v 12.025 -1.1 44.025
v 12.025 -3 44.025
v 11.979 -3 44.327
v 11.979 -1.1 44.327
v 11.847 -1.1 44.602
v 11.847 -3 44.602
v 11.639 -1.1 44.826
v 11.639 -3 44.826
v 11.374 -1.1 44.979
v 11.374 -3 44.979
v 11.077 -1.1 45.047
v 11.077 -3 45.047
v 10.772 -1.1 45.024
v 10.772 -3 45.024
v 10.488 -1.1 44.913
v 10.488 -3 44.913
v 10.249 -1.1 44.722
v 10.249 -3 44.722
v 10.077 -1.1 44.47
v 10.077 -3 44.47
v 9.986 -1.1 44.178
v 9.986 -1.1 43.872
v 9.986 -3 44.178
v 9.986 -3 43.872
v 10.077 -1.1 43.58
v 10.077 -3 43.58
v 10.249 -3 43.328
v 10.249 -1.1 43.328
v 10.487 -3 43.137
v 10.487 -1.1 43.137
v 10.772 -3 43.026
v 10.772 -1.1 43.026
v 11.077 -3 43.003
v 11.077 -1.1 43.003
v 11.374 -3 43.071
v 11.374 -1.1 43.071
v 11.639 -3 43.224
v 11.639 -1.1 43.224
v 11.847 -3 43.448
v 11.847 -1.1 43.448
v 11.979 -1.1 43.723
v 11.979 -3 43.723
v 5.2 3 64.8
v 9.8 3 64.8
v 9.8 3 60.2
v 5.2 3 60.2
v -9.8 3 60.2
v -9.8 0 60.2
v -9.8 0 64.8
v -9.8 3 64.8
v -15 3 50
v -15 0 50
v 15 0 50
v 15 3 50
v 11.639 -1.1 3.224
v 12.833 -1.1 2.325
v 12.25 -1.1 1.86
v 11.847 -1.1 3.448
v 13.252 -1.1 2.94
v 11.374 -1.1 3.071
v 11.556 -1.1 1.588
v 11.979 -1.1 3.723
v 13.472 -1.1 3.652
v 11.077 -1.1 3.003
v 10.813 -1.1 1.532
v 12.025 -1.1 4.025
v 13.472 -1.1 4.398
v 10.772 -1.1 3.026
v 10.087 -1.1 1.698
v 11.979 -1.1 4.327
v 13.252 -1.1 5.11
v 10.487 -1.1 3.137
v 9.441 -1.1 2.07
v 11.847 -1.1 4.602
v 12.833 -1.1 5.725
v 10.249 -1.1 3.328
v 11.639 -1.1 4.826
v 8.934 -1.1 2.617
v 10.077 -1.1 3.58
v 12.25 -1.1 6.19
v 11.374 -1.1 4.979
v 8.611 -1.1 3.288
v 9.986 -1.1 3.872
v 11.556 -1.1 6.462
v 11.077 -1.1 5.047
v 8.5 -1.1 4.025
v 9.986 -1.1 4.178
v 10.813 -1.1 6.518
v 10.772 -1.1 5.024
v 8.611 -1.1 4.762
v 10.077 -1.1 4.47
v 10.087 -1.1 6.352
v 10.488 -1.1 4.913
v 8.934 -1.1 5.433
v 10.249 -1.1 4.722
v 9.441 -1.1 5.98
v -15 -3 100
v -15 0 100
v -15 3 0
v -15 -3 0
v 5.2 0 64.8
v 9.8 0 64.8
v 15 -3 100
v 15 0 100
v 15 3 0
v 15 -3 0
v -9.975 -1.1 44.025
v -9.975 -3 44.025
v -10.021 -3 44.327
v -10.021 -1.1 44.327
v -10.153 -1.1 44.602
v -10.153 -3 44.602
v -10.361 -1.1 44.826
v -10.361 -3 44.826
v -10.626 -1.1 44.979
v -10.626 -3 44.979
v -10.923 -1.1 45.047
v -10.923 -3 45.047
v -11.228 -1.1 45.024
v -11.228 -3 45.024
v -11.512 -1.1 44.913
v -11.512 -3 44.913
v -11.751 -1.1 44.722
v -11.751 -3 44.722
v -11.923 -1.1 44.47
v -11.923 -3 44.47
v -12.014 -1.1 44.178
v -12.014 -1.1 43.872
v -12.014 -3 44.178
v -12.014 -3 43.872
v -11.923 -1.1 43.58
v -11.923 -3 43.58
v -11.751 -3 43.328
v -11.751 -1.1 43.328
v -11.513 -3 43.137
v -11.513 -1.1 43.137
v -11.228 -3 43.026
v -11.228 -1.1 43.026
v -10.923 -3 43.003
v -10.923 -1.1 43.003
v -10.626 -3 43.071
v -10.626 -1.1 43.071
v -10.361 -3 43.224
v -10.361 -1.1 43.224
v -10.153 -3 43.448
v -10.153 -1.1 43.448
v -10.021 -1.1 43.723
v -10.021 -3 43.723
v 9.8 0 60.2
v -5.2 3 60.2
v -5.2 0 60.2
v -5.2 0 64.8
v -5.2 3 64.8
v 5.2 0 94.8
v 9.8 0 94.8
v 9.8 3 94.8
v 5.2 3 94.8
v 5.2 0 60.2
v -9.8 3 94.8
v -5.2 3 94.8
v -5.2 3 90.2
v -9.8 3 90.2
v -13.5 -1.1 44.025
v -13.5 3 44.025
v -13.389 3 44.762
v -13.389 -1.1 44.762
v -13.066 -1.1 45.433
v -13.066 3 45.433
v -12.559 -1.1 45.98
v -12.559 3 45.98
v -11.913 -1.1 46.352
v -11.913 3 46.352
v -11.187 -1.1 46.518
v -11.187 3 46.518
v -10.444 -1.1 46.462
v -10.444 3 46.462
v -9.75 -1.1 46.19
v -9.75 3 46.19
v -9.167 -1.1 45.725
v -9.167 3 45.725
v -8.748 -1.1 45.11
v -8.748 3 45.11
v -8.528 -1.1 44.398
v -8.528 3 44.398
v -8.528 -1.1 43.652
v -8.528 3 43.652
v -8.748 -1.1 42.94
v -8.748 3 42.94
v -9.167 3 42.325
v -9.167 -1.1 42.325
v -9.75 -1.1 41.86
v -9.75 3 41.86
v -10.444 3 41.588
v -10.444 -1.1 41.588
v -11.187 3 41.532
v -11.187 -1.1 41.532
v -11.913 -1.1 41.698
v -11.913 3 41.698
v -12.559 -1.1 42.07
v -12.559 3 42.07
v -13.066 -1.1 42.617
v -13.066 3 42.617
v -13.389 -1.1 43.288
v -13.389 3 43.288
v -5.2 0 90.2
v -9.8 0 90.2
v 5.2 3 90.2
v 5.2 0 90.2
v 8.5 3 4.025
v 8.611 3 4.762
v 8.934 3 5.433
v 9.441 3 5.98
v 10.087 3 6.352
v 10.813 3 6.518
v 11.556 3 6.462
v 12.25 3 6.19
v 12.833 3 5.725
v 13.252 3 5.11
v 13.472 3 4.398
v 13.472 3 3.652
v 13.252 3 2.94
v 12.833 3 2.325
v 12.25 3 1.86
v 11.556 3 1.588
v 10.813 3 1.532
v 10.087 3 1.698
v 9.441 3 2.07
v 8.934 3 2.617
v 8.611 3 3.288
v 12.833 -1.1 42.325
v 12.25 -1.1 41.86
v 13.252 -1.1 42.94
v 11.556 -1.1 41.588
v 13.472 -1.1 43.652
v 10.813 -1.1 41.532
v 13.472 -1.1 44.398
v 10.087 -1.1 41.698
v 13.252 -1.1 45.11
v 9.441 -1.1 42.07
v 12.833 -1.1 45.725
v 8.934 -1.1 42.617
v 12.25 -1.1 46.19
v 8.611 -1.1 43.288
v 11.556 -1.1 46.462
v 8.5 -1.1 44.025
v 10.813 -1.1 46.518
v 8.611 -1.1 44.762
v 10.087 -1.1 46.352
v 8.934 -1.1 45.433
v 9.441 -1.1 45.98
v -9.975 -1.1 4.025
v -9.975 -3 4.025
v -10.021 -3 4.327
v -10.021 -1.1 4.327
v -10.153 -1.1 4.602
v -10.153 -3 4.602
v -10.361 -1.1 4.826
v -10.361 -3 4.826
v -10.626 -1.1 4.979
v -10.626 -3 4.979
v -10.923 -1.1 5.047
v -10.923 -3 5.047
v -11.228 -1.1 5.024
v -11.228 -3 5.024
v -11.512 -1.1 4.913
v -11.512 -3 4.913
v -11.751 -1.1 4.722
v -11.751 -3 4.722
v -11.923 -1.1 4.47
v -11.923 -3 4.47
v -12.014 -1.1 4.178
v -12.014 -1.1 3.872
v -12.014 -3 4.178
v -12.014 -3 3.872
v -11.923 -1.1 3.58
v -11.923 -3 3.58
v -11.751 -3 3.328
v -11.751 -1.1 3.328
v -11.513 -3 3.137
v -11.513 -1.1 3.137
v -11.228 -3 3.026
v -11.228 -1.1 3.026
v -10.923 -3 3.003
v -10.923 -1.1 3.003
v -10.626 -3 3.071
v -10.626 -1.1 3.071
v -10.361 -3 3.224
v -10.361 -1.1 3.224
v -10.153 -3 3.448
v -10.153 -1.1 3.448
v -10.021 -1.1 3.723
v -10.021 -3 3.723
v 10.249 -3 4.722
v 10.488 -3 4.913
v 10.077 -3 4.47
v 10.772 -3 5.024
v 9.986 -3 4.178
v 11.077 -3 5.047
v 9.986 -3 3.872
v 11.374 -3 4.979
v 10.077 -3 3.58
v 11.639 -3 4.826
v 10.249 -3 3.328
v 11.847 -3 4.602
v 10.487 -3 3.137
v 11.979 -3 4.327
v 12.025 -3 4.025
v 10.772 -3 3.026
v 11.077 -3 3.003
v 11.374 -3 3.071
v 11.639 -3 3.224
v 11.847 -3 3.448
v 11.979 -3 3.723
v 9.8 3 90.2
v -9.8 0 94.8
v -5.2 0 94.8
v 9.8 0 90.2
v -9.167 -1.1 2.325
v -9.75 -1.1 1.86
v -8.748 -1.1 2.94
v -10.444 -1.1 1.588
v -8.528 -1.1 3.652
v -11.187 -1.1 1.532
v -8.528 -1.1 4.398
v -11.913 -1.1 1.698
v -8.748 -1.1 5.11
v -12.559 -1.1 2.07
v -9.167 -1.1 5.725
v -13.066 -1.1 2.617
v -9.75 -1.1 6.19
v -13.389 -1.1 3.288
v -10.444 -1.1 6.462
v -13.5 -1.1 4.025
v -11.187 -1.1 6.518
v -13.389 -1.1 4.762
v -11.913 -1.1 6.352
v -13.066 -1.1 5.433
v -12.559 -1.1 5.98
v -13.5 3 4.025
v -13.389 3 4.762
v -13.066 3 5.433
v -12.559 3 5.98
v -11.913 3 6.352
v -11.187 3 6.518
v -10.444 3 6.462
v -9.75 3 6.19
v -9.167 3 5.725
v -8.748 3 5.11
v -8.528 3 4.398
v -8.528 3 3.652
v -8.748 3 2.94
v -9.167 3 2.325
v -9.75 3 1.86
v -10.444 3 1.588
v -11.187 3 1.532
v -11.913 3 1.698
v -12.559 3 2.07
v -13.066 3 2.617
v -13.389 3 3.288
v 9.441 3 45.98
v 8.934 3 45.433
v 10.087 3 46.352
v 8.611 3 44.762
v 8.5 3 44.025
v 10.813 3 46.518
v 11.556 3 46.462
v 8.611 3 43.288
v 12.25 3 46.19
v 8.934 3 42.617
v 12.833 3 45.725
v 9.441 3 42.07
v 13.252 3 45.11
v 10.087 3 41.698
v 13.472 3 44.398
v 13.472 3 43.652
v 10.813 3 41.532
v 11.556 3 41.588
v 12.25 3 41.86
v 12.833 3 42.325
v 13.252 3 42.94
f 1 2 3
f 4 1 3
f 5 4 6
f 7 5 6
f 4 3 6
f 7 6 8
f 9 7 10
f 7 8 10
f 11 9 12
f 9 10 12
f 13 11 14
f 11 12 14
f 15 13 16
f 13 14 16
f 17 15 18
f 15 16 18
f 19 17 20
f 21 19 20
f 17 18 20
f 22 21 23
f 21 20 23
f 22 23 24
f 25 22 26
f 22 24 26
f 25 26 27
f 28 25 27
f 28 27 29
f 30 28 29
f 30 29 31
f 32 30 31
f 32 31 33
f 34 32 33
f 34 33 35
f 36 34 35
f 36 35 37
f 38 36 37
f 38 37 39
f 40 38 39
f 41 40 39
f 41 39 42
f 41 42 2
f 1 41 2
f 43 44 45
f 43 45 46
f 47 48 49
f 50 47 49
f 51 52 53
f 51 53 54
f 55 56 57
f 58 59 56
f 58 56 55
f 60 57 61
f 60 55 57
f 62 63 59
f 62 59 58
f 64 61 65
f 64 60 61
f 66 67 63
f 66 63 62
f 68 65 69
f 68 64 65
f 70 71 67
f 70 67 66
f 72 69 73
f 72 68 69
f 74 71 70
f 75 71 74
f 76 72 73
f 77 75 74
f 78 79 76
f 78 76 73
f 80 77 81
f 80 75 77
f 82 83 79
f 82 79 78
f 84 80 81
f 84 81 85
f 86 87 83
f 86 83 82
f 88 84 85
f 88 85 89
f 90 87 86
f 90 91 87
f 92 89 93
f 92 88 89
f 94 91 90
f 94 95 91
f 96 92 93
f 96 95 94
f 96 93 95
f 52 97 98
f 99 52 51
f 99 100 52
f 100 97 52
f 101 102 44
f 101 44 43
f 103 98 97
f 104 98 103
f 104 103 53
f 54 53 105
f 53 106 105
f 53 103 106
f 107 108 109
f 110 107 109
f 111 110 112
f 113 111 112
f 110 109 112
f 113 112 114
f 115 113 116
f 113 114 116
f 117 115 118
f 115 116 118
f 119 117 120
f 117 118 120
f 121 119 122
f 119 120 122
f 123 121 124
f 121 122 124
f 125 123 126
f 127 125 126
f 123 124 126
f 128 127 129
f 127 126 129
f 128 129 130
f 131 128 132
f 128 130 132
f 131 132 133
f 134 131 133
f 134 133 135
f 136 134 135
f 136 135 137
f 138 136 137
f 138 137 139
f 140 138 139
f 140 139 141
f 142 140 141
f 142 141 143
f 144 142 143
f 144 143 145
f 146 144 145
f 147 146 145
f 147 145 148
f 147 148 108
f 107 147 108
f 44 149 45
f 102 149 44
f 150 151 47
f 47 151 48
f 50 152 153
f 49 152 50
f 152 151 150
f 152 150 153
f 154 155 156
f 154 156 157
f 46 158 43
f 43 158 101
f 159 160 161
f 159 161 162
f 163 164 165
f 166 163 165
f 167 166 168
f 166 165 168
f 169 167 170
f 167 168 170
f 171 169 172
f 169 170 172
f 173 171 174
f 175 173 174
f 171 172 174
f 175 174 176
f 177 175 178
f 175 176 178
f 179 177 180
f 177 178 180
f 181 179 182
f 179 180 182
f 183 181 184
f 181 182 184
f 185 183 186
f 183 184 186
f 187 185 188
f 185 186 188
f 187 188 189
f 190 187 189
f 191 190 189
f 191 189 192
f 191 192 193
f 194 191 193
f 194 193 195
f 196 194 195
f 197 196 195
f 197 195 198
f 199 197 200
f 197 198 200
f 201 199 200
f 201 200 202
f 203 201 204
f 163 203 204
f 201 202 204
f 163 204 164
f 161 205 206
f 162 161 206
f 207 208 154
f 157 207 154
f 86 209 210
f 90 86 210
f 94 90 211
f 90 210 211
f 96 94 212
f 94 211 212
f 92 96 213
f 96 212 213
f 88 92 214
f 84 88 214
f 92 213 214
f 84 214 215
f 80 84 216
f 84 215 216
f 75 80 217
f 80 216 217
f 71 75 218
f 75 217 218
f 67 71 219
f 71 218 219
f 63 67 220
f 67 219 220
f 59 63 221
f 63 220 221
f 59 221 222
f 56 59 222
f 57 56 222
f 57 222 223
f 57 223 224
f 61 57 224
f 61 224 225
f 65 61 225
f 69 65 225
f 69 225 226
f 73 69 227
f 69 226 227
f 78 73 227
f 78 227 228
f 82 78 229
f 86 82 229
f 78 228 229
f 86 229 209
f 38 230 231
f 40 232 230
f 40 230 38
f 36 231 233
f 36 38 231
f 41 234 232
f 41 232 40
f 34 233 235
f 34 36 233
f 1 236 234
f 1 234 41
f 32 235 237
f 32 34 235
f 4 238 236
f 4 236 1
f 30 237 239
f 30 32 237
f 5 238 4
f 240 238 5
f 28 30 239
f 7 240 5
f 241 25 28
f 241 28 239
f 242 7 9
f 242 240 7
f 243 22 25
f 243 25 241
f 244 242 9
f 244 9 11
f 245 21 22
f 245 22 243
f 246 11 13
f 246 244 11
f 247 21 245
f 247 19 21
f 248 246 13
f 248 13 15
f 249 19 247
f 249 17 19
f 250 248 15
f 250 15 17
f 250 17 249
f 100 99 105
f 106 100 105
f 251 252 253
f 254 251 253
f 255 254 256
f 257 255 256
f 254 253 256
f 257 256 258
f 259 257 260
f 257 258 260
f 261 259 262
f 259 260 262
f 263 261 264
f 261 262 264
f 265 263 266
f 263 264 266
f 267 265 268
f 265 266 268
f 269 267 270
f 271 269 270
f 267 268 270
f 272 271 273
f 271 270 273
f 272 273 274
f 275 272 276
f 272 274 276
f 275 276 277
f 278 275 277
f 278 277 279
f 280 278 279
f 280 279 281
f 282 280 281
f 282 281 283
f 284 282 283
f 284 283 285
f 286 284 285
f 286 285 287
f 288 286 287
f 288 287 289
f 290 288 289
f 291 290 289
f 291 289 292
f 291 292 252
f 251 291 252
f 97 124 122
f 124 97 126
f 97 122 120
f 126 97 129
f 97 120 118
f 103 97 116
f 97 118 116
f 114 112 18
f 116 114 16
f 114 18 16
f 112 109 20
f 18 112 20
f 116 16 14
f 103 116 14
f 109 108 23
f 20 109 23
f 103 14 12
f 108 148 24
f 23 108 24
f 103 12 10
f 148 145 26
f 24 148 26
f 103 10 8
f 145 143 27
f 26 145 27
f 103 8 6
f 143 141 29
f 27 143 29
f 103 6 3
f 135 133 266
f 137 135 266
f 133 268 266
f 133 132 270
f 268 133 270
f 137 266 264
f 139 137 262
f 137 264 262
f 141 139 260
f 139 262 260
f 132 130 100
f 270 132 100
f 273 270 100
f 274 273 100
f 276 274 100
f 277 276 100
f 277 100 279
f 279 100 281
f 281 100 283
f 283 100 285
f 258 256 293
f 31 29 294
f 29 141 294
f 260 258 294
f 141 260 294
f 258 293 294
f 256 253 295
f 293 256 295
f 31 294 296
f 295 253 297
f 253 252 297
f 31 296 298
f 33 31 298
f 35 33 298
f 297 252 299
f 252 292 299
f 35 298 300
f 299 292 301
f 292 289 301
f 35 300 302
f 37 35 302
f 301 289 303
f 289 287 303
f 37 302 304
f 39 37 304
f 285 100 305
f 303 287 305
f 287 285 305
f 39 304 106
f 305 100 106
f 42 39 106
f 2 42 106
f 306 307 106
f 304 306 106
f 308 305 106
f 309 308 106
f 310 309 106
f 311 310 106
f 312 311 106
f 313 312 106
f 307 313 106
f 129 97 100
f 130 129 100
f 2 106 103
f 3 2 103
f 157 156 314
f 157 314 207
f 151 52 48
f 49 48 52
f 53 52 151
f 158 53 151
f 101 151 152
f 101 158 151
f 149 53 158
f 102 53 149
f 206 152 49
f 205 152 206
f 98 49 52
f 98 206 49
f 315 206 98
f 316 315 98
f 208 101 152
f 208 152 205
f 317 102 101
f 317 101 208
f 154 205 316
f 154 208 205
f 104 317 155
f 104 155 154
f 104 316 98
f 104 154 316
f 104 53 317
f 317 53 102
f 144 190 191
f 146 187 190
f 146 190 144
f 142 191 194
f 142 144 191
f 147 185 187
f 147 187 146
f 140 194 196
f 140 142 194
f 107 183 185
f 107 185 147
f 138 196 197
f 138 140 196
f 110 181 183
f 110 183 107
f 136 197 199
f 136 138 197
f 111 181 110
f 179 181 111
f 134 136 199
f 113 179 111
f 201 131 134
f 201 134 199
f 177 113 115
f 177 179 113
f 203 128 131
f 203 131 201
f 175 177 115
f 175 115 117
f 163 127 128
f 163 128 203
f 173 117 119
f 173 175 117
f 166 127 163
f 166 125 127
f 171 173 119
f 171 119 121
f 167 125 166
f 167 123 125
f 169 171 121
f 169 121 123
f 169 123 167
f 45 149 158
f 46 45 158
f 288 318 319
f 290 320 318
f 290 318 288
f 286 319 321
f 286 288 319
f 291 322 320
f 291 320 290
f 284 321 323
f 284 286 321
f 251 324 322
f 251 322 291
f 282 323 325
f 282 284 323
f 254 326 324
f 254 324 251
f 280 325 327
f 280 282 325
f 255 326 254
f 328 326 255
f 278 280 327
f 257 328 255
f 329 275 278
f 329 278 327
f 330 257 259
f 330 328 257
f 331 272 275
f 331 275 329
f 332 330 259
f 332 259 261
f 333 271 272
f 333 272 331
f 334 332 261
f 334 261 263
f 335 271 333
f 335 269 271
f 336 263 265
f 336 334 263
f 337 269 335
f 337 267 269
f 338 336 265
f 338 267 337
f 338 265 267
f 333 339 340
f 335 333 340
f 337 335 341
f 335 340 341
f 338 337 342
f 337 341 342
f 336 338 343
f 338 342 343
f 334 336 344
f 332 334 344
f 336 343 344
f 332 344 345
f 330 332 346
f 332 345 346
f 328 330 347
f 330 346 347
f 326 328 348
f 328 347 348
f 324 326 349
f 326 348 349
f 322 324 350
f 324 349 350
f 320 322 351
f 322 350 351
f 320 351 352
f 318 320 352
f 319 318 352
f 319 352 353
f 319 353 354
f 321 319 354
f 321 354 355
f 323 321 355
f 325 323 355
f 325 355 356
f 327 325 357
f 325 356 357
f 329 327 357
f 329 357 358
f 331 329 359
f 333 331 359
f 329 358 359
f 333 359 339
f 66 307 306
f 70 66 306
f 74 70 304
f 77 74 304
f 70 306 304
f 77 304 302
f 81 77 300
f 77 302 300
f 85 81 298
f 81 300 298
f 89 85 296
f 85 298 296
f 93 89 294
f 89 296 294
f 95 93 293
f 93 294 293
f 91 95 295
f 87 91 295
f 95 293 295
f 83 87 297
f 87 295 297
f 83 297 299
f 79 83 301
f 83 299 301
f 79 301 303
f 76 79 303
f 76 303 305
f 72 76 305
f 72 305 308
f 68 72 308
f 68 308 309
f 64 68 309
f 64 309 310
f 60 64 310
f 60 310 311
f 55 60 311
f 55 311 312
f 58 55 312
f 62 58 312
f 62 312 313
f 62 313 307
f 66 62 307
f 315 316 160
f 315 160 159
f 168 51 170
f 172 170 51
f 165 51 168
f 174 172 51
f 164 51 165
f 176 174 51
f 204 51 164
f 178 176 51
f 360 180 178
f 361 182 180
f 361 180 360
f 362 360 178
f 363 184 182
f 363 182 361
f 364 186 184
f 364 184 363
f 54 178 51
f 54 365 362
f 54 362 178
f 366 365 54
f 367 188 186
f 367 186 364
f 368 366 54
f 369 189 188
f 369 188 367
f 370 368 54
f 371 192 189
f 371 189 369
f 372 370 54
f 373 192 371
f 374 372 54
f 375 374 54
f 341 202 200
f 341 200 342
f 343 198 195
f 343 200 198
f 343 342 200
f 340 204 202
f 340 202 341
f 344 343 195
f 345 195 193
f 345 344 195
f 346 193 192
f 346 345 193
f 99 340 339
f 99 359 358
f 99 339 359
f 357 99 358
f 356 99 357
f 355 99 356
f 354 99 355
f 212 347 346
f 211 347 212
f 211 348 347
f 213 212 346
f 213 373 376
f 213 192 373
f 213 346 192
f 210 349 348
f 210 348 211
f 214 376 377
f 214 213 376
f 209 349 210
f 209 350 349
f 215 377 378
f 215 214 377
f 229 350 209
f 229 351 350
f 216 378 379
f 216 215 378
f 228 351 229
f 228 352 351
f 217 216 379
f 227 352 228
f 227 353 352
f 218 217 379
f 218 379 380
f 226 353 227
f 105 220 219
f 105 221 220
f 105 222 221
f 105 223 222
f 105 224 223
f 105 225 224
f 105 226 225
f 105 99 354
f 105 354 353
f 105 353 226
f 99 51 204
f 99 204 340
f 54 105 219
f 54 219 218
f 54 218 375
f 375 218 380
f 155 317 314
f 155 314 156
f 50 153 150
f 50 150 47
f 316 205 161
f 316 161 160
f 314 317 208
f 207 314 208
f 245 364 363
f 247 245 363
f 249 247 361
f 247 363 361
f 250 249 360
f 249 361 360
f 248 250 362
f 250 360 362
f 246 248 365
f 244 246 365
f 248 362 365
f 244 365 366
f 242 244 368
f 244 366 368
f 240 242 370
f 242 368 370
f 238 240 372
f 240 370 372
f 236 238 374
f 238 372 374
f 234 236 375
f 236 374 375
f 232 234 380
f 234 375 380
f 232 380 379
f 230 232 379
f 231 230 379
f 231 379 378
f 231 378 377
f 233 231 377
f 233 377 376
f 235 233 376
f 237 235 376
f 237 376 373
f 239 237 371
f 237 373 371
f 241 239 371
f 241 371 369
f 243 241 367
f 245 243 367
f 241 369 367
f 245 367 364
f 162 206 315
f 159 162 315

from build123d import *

# Parameters (mm, degrees)
F0_W     = 30
F0_H     = 6
F1_DEPTH = 100
F2_R     = 1.025
F3_DEPTH = 6
F4_W     = 3
F4_H     = 50
F5_DEPTH = 30
F6_W     = 4.600006
F6_H     = 4.600006
F6_W_2   = 4.6
F6_H_2   = 4.6
F6_W_3   = 4.600004
F6_H_3   = 4.600004
F7_DEPTH = 3
F8_R     = 2.5
F9_DEPTH = 4.1


with BuildPart() as f1:
    # F0 (on Top) → F1 (new body)
    with BuildSketch(Plane.XY):
        Rectangle(F0_W, F0_H)
    extrude(amount=F1_DEPTH)

    # F2 (on face) → F3 (cut, through all)
    with BuildSketch(Plane.XZ.offset(3)):
        with Locations((11, 4.025)):
            Circle(F2_R)
        with Locations((11, 44.025)):
            Circle(F2_R)
        with Locations((-11, 44.025)):
            Circle(F2_R)
        with Locations((-11, 4.025)):
            Circle(F2_R)
    extrude(amount=-F3_DEPTH, mode=Mode.SUBTRACT)

    # F4 (on face) → F5 (cut, through all)
    with BuildSketch(Plane.YZ.offset(15)):
        with Locations((1.5, 75)):
            Rectangle(F4_W, F4_H)
    extrude(amount=-F5_DEPTH, mode=Mode.SUBTRACT)

    # F6 (on face) → F7 (join)
    with BuildSketch(Plane(origin=(0, 0, 0), x_dir=(-1, 0, 0), z_dir=(0, 1, 0))):
        with Locations((-7.5, 92.5)):
            Rectangle(F6_W, F6_H)
        with Locations((7.5, 92.5)):
            Rectangle(F6_W, F6_H)
        with Locations((-7.5, 62.5)):
            Rectangle(F6_W_2, F6_H_2)
        with Locations((7.5, 62.5)):
            Rectangle(F6_W_3, F6_H_3)
    extrude(amount=F7_DEPTH)

    # F8 (on face) → F9 (cut)
    with BuildSketch(Plane(origin=(0, 3, 0), x_dir=(-1, 0, 0), z_dir=(0, 1, 0))):
        with Locations((11, 44.025)):
            Circle(F8_R)
        with Locations((-11, 44.025)):
            Circle(F8_R)
        with Locations((-11, 4.025)):
            Circle(F8_R)
        with Locations((11, 4.025)):
            Circle(F8_R)
    extrude(amount=-F9_DEPTH, mode=Mode.SUBTRACT)


solid = f1.part
